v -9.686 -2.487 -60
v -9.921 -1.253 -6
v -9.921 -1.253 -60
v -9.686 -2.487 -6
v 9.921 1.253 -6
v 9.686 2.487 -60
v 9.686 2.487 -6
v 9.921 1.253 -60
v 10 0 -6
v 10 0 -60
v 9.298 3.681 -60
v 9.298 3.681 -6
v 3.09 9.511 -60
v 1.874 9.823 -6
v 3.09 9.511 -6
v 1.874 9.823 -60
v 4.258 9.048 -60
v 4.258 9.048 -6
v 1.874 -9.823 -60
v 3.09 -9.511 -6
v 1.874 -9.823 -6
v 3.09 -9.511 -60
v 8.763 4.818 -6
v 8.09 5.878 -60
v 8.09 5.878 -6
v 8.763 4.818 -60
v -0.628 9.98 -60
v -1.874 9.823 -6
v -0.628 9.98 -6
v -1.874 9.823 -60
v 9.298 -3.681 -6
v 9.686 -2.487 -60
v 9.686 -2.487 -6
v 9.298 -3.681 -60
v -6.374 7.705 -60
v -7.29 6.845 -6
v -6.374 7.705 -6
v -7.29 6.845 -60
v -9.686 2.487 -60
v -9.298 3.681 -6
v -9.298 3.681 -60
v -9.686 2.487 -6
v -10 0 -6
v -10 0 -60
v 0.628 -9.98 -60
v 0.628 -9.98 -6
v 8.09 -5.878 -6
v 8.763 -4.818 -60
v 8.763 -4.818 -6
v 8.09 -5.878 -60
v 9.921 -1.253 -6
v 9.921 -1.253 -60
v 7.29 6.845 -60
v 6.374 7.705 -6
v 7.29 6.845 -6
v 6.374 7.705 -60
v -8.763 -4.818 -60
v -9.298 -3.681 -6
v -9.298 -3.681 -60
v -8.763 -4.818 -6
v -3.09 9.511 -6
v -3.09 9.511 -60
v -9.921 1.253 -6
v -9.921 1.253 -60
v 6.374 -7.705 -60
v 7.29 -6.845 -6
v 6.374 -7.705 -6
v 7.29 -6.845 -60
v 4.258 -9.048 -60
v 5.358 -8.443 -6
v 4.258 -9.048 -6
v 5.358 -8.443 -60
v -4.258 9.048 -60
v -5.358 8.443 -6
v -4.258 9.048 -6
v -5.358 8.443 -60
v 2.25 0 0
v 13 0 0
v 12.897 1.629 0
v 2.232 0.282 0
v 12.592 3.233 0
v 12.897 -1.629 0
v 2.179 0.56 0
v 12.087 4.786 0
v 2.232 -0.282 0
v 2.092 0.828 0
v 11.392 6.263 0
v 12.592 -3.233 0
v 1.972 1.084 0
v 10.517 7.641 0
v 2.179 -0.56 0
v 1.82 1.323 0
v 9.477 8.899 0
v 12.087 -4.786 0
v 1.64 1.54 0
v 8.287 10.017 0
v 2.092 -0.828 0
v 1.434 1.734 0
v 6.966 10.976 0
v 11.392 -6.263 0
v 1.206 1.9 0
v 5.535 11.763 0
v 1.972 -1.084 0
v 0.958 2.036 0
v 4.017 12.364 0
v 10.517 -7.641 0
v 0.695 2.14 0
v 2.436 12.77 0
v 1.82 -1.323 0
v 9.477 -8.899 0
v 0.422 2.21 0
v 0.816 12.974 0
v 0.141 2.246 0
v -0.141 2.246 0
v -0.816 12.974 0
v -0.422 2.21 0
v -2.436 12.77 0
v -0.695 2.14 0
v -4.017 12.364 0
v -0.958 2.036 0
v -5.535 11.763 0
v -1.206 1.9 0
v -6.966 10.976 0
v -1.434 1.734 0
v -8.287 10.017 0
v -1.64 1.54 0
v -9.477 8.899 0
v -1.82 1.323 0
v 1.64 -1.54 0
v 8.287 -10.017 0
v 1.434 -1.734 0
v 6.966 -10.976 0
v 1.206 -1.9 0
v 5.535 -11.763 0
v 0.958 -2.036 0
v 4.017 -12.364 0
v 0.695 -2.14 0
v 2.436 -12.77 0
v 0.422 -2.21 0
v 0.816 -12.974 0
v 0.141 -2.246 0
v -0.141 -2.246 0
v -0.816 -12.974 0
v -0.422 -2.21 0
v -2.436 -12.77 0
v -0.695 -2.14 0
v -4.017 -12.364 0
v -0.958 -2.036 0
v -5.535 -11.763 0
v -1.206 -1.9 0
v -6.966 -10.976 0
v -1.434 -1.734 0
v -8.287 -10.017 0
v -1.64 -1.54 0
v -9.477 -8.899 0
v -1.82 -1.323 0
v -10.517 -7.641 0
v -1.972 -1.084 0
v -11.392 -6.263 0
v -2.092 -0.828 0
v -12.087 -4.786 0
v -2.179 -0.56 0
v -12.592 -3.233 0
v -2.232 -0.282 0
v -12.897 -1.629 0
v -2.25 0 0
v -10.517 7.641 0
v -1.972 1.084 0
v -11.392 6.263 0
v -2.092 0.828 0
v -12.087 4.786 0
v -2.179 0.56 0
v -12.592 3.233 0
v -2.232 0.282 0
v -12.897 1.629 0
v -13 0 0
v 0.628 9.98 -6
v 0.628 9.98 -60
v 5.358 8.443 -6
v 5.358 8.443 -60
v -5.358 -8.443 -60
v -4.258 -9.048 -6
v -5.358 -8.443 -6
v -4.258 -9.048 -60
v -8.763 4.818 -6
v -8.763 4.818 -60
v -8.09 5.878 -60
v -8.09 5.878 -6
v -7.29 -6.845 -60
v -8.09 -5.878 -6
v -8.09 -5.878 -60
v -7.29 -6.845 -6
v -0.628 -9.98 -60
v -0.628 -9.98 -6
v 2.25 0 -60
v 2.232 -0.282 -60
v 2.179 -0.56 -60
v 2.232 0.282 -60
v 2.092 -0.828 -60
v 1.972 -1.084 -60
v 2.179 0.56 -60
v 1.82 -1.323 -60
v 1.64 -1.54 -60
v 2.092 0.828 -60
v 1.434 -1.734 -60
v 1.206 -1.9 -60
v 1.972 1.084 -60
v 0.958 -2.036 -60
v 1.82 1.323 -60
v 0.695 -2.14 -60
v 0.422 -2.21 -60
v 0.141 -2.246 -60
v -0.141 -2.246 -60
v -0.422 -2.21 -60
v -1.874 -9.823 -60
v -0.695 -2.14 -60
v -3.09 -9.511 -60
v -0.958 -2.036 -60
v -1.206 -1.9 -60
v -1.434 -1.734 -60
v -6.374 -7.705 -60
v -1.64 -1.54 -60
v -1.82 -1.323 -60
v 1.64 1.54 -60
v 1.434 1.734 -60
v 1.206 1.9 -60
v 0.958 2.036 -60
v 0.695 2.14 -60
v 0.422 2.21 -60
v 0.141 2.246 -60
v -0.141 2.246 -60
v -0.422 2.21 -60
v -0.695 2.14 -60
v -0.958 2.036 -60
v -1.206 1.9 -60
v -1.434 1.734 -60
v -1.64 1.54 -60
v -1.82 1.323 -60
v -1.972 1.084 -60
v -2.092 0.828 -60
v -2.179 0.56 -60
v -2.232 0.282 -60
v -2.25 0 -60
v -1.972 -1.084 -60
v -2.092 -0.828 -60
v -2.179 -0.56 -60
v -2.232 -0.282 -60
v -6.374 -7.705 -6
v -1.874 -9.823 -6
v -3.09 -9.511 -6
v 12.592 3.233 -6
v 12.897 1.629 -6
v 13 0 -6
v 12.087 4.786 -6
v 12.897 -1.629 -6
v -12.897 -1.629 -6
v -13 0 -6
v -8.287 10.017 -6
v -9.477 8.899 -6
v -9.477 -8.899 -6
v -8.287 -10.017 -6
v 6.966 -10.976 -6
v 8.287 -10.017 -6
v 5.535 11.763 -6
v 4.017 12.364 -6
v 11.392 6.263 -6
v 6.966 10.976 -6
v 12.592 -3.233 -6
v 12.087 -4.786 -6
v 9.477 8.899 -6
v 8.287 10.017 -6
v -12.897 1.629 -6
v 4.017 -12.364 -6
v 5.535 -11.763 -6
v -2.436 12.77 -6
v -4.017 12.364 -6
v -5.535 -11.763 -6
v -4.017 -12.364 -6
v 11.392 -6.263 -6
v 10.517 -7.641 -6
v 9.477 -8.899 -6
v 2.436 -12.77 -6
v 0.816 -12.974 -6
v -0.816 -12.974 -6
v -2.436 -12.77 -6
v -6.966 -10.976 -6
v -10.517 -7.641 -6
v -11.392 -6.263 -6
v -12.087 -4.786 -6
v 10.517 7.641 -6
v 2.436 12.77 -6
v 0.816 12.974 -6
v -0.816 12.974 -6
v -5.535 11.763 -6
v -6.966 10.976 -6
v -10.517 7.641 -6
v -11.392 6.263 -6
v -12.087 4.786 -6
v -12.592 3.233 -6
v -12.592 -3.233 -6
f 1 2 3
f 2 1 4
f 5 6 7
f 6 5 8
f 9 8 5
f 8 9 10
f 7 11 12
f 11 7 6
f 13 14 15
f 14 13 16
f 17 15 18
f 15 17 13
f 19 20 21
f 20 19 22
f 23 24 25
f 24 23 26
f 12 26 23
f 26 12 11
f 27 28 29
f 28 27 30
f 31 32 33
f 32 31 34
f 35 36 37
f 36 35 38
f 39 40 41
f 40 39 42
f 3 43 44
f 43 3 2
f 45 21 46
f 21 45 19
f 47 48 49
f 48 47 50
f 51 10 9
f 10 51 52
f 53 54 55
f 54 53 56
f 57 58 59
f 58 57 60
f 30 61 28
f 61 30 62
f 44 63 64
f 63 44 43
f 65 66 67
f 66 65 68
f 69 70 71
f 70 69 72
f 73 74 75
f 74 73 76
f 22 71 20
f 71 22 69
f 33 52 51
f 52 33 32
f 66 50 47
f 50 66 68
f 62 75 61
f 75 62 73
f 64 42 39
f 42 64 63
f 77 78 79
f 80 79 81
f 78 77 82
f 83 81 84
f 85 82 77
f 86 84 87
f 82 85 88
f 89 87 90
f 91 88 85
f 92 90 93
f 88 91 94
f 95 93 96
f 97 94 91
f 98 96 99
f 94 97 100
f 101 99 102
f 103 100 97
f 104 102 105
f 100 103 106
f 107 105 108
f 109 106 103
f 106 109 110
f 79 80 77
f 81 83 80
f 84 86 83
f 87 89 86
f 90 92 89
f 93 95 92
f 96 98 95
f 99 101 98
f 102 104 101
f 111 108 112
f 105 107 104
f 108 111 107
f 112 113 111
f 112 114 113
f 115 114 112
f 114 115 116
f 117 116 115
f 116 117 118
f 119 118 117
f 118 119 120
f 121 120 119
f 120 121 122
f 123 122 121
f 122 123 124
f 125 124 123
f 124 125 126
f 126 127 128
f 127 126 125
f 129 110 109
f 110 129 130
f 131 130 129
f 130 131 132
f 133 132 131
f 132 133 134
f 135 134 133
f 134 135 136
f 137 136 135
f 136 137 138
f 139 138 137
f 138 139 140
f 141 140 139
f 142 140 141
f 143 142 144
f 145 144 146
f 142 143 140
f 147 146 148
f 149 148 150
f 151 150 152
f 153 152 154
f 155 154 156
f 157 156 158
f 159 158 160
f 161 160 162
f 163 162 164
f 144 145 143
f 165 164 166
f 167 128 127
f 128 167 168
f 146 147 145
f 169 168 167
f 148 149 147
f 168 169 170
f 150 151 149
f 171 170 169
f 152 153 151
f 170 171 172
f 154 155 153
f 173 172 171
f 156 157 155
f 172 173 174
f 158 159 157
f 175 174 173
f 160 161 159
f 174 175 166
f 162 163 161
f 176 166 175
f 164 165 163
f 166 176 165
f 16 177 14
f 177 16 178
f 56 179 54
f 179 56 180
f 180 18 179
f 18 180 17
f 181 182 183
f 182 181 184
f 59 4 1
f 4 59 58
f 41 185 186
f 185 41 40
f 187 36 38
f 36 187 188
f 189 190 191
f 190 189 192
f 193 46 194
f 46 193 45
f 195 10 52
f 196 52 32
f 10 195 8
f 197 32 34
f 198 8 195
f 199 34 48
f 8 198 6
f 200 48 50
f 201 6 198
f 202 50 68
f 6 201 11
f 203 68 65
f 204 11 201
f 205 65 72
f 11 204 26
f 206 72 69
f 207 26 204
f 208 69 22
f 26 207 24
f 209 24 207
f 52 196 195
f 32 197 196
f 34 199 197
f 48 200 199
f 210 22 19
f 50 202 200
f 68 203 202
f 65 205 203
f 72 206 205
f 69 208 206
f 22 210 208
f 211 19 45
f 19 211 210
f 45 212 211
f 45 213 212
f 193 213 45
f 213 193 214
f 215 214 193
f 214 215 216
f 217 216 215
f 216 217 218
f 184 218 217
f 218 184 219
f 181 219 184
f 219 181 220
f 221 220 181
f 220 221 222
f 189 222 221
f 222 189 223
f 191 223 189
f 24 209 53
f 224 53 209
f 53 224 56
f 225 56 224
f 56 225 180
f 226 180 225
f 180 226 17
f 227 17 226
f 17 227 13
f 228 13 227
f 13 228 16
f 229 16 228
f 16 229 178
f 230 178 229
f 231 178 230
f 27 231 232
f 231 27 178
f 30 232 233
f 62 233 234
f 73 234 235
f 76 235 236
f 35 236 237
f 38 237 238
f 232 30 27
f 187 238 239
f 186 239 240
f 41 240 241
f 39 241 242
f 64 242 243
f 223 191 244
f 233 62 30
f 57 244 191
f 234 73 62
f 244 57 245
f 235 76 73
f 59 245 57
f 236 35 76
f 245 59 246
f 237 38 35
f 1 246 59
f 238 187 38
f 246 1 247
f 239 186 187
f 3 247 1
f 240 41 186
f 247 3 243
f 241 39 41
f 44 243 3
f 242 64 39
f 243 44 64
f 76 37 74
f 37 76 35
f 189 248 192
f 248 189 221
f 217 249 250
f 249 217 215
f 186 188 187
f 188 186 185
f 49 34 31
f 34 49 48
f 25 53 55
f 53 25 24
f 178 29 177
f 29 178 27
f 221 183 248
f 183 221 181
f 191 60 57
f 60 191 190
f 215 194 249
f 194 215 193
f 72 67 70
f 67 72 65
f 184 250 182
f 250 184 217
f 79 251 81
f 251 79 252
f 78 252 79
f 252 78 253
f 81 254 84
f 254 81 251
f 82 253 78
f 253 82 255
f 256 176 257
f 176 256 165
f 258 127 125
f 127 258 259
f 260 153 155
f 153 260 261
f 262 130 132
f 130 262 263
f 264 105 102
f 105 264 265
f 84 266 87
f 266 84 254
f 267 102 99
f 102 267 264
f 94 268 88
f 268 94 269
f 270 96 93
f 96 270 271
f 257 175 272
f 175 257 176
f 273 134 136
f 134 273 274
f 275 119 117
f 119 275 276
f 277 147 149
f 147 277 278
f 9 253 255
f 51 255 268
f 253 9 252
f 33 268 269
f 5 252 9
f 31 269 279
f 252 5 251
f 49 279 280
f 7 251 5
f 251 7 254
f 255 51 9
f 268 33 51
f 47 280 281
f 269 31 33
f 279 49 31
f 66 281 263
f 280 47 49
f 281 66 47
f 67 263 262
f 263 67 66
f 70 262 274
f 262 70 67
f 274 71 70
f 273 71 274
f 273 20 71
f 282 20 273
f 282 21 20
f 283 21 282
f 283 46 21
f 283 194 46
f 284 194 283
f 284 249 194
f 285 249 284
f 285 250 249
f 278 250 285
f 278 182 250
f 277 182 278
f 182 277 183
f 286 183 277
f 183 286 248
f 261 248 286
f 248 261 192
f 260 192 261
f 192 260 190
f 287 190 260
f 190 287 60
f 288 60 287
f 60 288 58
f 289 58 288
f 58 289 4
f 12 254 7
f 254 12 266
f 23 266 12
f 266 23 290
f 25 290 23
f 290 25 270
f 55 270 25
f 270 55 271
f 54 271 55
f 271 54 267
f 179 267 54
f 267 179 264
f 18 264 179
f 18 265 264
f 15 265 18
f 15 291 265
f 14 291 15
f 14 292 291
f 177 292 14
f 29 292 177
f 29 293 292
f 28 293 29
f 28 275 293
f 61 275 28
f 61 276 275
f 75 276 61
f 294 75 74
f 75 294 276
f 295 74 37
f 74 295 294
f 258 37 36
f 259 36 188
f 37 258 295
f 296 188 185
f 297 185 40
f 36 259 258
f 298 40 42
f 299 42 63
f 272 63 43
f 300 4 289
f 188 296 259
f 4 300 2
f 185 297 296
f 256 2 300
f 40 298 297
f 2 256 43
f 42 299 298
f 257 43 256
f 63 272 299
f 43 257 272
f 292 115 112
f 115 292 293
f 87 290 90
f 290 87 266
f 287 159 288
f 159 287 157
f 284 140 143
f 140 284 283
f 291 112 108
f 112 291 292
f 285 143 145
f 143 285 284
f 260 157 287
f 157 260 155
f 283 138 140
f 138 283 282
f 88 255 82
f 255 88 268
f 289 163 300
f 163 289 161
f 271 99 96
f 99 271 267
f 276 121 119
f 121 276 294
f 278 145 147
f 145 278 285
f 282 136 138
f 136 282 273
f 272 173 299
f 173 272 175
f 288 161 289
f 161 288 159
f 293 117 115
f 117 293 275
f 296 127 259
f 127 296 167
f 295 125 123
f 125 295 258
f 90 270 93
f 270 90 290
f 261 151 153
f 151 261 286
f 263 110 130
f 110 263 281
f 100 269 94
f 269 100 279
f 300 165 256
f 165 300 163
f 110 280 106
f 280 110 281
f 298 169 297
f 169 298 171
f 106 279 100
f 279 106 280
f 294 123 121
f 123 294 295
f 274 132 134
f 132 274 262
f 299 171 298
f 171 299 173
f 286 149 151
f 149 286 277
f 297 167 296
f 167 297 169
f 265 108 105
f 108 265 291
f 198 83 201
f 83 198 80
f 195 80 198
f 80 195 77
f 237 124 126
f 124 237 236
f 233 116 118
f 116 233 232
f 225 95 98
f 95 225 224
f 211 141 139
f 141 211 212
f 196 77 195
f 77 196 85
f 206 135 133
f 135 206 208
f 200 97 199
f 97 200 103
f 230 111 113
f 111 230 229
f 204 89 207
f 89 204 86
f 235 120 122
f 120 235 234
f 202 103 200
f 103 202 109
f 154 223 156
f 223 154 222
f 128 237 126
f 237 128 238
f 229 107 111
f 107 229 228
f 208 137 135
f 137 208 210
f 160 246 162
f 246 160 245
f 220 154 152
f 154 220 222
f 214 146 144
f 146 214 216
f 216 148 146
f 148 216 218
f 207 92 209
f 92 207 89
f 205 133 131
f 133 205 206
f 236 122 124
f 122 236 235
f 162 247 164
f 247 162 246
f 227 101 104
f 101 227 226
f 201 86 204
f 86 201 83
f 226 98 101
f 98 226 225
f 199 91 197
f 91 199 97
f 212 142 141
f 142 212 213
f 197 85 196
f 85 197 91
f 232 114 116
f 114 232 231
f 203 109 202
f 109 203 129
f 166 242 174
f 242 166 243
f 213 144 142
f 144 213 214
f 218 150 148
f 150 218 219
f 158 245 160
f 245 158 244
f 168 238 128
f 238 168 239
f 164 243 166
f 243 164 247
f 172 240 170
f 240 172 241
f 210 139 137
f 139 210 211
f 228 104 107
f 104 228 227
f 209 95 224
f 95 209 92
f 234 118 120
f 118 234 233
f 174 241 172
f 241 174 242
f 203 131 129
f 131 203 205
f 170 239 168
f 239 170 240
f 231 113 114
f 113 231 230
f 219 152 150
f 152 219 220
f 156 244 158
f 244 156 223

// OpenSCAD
$fn = 50;


difference() {
	union() {
		translate(v = [0, 0, -60.0000000000]) {
			cylinder(h = 60, r = 10.0000000000);
		}
		translate(v = [0, 0, -6.0000000000]) {
			cylinder(h = 6, r = 13.0000000000);
		}
	}
	union() {
		#translate(v = [0, 0, -60]) {
			cylinder(h = 60, r = 2.2500000000);
		}
	}
}
